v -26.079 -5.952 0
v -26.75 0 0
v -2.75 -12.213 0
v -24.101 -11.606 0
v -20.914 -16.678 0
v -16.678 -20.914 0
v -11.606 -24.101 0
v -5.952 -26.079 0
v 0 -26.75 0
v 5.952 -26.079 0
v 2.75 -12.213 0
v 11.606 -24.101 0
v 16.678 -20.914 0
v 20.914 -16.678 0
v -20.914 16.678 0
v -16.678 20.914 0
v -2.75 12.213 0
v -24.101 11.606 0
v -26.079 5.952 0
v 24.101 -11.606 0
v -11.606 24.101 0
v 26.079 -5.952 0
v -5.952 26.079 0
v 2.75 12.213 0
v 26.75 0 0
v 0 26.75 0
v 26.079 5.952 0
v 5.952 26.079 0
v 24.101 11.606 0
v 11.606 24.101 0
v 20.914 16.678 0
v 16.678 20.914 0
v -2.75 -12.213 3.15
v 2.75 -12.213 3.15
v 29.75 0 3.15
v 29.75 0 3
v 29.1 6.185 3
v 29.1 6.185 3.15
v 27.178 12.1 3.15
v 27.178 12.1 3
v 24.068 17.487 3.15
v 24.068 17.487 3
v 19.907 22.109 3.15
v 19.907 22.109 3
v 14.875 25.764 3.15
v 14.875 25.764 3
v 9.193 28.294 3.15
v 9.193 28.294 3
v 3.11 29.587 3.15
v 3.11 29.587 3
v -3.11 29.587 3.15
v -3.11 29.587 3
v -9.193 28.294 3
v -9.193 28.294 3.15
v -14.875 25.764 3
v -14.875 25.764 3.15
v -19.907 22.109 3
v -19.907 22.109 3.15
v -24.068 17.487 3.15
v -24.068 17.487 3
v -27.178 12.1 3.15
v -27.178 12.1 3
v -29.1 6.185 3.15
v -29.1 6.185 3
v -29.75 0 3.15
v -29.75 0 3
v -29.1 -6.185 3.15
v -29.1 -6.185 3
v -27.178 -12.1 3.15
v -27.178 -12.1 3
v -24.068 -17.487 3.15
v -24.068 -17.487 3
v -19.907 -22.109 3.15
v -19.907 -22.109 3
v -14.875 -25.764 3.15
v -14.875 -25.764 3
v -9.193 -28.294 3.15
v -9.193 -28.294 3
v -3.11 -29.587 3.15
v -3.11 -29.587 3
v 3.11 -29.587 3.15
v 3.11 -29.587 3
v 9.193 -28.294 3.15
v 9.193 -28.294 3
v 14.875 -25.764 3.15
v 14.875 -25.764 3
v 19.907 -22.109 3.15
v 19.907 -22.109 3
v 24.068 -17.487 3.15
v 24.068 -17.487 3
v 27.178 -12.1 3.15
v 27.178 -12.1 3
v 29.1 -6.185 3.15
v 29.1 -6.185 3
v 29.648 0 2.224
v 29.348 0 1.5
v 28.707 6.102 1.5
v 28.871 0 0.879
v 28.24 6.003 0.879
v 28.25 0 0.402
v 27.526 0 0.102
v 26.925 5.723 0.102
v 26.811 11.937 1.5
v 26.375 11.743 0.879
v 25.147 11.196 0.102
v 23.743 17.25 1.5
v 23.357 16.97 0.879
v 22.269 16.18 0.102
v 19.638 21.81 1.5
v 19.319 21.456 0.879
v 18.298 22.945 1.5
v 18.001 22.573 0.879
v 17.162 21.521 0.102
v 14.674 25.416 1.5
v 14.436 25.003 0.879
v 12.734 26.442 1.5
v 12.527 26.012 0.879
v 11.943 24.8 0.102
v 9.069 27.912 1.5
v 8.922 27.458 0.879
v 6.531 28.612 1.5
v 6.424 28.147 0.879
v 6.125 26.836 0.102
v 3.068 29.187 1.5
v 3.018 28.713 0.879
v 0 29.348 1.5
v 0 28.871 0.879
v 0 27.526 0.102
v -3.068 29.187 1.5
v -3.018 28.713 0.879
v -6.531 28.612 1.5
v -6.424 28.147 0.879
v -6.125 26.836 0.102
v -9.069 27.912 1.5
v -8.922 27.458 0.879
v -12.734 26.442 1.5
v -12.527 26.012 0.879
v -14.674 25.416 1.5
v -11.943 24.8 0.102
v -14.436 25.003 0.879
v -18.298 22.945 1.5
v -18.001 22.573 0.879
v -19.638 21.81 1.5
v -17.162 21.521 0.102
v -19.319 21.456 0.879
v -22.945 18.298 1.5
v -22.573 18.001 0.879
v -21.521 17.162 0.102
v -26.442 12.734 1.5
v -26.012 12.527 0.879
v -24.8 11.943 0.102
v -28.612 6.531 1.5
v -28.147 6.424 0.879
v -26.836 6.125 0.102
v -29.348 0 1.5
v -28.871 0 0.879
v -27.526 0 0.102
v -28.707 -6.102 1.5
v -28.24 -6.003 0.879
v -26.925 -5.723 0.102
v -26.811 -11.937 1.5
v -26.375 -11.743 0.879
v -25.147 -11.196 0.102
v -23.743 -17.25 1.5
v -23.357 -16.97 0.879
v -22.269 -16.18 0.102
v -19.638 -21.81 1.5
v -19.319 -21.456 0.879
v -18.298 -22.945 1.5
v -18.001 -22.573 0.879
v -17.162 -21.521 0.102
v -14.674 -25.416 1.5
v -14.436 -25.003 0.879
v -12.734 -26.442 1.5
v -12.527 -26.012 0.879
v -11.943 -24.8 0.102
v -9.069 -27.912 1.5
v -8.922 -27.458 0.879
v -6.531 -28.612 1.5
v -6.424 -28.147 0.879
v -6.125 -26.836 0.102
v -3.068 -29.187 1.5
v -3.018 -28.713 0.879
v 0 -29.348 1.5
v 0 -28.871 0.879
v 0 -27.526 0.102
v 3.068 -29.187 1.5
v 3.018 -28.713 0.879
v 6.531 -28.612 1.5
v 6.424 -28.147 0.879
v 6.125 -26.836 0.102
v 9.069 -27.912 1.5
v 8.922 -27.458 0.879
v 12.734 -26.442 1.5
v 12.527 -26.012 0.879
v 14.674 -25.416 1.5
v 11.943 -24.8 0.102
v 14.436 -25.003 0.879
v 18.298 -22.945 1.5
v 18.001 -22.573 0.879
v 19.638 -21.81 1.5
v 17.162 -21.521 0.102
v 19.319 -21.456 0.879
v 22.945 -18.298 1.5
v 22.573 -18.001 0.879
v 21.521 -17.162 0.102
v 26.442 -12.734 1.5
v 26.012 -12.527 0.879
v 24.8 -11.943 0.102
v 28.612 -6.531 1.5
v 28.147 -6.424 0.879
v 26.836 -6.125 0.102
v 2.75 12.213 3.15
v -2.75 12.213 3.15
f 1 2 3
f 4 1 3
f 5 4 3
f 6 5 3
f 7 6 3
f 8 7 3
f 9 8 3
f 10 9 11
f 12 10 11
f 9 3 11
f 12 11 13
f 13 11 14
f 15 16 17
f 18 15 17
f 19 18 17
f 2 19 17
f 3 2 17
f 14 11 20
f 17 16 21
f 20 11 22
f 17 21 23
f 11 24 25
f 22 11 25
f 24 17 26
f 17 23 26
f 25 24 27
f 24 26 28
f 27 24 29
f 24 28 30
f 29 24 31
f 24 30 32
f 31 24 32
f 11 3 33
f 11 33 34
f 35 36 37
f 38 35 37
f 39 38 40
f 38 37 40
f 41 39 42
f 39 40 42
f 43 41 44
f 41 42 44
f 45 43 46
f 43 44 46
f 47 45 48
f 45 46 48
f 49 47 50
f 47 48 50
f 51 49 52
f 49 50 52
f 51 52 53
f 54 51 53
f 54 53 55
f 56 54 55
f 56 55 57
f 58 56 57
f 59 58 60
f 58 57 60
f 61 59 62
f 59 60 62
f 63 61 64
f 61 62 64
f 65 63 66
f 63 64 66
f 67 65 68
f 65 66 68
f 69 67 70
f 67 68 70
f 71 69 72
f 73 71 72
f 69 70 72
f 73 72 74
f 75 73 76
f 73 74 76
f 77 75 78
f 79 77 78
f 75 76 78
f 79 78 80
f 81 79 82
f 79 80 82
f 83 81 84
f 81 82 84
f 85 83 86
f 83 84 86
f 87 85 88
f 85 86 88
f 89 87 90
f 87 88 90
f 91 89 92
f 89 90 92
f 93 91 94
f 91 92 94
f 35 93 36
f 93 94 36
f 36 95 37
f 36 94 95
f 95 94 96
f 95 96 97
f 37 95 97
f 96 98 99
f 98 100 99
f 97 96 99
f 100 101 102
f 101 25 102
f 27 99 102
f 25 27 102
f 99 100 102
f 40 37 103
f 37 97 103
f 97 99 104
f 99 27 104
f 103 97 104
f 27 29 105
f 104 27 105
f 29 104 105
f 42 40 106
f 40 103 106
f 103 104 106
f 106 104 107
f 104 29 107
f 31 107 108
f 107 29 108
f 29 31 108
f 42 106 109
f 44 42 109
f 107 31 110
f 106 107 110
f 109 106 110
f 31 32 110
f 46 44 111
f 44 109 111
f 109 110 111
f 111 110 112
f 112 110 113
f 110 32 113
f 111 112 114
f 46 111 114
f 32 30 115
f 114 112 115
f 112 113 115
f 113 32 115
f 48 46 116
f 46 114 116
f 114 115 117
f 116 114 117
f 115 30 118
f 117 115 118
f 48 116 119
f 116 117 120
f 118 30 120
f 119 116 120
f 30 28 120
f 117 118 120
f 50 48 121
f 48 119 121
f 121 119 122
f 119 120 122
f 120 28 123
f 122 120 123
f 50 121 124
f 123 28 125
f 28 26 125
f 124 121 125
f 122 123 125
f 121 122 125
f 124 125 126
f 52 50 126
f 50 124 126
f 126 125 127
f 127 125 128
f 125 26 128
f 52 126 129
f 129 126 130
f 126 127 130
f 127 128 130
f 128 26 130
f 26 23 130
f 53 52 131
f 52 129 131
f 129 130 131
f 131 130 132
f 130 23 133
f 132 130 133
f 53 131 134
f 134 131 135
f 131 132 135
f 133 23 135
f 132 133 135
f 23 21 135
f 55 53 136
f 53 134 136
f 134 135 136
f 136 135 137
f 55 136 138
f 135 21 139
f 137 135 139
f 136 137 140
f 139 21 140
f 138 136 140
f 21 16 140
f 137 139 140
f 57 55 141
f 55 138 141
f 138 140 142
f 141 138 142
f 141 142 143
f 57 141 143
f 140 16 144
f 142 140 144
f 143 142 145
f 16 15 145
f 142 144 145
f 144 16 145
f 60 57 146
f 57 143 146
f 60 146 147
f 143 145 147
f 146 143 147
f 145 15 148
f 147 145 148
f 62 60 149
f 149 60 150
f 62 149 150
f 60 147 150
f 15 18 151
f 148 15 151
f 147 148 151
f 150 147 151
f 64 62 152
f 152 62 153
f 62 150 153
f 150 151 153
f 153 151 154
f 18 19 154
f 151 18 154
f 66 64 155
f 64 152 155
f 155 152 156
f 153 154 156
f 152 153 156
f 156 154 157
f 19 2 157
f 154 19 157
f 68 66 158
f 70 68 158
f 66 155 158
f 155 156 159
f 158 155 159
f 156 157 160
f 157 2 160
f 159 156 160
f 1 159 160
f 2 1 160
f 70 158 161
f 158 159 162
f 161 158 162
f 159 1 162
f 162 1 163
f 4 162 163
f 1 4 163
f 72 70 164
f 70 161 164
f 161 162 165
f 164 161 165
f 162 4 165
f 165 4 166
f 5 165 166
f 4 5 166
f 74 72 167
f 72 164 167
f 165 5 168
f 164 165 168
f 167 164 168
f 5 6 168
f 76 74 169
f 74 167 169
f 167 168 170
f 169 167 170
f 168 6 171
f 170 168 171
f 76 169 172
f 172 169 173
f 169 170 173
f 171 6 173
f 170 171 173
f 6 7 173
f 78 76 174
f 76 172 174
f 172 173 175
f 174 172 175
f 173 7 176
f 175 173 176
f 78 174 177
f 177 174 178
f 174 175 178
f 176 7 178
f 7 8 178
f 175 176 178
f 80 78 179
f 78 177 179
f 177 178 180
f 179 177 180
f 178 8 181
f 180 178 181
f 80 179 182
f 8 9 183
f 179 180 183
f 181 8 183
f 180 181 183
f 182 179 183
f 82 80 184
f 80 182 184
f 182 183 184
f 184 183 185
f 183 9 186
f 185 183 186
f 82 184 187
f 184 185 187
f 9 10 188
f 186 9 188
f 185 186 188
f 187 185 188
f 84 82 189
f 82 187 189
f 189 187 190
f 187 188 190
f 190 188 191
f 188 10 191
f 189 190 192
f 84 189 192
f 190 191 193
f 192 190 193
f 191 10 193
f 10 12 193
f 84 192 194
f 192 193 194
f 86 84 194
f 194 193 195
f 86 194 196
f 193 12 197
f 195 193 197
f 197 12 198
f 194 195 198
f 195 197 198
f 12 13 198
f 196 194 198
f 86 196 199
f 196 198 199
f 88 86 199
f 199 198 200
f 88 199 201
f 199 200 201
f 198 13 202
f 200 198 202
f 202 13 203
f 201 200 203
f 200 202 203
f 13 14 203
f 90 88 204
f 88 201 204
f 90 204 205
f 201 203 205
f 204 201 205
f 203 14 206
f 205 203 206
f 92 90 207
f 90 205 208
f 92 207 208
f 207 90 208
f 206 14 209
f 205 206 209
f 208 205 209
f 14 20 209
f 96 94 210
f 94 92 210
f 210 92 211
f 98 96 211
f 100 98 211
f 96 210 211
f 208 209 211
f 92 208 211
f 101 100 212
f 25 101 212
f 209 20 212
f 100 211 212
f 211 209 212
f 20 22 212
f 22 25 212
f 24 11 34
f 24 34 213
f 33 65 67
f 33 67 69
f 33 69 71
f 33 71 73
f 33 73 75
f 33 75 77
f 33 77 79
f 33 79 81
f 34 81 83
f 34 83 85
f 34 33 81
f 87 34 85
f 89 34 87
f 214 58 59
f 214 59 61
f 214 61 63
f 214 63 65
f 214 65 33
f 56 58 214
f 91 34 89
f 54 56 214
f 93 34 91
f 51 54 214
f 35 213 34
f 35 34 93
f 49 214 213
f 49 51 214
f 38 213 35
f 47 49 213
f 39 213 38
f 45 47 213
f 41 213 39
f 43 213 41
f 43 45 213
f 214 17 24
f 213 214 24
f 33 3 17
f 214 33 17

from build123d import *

# Parameters (mm, degrees)
F0_R     = 29.75
F2_DEPTH = 3.15
F1_W     = 5.5
F1_H     = 24.426396
F3_DEPTH = 3.15
F4_R     = 3


with BuildPart() as f2:
    # F0 (on Top) → F2 (new body)
    with BuildSketch(Plane.XY):
        Circle(F0_R)
    extrude(amount=F2_DEPTH)

    # F1 (on Top) → F3 (cut)
    with BuildSketch(Plane.XY):
        Rectangle(F1_W, F1_H)
    extrude(amount=F3_DEPTH, mode=Mode.SUBTRACT)

    # F4
    f4_edges = [f2.edges().sort_by_distance(p)[0] for p in [
        (-29.75, 0, 0),
    ]]
    fillet(f4_edges, radius=F4_R)


solid = f2.part
